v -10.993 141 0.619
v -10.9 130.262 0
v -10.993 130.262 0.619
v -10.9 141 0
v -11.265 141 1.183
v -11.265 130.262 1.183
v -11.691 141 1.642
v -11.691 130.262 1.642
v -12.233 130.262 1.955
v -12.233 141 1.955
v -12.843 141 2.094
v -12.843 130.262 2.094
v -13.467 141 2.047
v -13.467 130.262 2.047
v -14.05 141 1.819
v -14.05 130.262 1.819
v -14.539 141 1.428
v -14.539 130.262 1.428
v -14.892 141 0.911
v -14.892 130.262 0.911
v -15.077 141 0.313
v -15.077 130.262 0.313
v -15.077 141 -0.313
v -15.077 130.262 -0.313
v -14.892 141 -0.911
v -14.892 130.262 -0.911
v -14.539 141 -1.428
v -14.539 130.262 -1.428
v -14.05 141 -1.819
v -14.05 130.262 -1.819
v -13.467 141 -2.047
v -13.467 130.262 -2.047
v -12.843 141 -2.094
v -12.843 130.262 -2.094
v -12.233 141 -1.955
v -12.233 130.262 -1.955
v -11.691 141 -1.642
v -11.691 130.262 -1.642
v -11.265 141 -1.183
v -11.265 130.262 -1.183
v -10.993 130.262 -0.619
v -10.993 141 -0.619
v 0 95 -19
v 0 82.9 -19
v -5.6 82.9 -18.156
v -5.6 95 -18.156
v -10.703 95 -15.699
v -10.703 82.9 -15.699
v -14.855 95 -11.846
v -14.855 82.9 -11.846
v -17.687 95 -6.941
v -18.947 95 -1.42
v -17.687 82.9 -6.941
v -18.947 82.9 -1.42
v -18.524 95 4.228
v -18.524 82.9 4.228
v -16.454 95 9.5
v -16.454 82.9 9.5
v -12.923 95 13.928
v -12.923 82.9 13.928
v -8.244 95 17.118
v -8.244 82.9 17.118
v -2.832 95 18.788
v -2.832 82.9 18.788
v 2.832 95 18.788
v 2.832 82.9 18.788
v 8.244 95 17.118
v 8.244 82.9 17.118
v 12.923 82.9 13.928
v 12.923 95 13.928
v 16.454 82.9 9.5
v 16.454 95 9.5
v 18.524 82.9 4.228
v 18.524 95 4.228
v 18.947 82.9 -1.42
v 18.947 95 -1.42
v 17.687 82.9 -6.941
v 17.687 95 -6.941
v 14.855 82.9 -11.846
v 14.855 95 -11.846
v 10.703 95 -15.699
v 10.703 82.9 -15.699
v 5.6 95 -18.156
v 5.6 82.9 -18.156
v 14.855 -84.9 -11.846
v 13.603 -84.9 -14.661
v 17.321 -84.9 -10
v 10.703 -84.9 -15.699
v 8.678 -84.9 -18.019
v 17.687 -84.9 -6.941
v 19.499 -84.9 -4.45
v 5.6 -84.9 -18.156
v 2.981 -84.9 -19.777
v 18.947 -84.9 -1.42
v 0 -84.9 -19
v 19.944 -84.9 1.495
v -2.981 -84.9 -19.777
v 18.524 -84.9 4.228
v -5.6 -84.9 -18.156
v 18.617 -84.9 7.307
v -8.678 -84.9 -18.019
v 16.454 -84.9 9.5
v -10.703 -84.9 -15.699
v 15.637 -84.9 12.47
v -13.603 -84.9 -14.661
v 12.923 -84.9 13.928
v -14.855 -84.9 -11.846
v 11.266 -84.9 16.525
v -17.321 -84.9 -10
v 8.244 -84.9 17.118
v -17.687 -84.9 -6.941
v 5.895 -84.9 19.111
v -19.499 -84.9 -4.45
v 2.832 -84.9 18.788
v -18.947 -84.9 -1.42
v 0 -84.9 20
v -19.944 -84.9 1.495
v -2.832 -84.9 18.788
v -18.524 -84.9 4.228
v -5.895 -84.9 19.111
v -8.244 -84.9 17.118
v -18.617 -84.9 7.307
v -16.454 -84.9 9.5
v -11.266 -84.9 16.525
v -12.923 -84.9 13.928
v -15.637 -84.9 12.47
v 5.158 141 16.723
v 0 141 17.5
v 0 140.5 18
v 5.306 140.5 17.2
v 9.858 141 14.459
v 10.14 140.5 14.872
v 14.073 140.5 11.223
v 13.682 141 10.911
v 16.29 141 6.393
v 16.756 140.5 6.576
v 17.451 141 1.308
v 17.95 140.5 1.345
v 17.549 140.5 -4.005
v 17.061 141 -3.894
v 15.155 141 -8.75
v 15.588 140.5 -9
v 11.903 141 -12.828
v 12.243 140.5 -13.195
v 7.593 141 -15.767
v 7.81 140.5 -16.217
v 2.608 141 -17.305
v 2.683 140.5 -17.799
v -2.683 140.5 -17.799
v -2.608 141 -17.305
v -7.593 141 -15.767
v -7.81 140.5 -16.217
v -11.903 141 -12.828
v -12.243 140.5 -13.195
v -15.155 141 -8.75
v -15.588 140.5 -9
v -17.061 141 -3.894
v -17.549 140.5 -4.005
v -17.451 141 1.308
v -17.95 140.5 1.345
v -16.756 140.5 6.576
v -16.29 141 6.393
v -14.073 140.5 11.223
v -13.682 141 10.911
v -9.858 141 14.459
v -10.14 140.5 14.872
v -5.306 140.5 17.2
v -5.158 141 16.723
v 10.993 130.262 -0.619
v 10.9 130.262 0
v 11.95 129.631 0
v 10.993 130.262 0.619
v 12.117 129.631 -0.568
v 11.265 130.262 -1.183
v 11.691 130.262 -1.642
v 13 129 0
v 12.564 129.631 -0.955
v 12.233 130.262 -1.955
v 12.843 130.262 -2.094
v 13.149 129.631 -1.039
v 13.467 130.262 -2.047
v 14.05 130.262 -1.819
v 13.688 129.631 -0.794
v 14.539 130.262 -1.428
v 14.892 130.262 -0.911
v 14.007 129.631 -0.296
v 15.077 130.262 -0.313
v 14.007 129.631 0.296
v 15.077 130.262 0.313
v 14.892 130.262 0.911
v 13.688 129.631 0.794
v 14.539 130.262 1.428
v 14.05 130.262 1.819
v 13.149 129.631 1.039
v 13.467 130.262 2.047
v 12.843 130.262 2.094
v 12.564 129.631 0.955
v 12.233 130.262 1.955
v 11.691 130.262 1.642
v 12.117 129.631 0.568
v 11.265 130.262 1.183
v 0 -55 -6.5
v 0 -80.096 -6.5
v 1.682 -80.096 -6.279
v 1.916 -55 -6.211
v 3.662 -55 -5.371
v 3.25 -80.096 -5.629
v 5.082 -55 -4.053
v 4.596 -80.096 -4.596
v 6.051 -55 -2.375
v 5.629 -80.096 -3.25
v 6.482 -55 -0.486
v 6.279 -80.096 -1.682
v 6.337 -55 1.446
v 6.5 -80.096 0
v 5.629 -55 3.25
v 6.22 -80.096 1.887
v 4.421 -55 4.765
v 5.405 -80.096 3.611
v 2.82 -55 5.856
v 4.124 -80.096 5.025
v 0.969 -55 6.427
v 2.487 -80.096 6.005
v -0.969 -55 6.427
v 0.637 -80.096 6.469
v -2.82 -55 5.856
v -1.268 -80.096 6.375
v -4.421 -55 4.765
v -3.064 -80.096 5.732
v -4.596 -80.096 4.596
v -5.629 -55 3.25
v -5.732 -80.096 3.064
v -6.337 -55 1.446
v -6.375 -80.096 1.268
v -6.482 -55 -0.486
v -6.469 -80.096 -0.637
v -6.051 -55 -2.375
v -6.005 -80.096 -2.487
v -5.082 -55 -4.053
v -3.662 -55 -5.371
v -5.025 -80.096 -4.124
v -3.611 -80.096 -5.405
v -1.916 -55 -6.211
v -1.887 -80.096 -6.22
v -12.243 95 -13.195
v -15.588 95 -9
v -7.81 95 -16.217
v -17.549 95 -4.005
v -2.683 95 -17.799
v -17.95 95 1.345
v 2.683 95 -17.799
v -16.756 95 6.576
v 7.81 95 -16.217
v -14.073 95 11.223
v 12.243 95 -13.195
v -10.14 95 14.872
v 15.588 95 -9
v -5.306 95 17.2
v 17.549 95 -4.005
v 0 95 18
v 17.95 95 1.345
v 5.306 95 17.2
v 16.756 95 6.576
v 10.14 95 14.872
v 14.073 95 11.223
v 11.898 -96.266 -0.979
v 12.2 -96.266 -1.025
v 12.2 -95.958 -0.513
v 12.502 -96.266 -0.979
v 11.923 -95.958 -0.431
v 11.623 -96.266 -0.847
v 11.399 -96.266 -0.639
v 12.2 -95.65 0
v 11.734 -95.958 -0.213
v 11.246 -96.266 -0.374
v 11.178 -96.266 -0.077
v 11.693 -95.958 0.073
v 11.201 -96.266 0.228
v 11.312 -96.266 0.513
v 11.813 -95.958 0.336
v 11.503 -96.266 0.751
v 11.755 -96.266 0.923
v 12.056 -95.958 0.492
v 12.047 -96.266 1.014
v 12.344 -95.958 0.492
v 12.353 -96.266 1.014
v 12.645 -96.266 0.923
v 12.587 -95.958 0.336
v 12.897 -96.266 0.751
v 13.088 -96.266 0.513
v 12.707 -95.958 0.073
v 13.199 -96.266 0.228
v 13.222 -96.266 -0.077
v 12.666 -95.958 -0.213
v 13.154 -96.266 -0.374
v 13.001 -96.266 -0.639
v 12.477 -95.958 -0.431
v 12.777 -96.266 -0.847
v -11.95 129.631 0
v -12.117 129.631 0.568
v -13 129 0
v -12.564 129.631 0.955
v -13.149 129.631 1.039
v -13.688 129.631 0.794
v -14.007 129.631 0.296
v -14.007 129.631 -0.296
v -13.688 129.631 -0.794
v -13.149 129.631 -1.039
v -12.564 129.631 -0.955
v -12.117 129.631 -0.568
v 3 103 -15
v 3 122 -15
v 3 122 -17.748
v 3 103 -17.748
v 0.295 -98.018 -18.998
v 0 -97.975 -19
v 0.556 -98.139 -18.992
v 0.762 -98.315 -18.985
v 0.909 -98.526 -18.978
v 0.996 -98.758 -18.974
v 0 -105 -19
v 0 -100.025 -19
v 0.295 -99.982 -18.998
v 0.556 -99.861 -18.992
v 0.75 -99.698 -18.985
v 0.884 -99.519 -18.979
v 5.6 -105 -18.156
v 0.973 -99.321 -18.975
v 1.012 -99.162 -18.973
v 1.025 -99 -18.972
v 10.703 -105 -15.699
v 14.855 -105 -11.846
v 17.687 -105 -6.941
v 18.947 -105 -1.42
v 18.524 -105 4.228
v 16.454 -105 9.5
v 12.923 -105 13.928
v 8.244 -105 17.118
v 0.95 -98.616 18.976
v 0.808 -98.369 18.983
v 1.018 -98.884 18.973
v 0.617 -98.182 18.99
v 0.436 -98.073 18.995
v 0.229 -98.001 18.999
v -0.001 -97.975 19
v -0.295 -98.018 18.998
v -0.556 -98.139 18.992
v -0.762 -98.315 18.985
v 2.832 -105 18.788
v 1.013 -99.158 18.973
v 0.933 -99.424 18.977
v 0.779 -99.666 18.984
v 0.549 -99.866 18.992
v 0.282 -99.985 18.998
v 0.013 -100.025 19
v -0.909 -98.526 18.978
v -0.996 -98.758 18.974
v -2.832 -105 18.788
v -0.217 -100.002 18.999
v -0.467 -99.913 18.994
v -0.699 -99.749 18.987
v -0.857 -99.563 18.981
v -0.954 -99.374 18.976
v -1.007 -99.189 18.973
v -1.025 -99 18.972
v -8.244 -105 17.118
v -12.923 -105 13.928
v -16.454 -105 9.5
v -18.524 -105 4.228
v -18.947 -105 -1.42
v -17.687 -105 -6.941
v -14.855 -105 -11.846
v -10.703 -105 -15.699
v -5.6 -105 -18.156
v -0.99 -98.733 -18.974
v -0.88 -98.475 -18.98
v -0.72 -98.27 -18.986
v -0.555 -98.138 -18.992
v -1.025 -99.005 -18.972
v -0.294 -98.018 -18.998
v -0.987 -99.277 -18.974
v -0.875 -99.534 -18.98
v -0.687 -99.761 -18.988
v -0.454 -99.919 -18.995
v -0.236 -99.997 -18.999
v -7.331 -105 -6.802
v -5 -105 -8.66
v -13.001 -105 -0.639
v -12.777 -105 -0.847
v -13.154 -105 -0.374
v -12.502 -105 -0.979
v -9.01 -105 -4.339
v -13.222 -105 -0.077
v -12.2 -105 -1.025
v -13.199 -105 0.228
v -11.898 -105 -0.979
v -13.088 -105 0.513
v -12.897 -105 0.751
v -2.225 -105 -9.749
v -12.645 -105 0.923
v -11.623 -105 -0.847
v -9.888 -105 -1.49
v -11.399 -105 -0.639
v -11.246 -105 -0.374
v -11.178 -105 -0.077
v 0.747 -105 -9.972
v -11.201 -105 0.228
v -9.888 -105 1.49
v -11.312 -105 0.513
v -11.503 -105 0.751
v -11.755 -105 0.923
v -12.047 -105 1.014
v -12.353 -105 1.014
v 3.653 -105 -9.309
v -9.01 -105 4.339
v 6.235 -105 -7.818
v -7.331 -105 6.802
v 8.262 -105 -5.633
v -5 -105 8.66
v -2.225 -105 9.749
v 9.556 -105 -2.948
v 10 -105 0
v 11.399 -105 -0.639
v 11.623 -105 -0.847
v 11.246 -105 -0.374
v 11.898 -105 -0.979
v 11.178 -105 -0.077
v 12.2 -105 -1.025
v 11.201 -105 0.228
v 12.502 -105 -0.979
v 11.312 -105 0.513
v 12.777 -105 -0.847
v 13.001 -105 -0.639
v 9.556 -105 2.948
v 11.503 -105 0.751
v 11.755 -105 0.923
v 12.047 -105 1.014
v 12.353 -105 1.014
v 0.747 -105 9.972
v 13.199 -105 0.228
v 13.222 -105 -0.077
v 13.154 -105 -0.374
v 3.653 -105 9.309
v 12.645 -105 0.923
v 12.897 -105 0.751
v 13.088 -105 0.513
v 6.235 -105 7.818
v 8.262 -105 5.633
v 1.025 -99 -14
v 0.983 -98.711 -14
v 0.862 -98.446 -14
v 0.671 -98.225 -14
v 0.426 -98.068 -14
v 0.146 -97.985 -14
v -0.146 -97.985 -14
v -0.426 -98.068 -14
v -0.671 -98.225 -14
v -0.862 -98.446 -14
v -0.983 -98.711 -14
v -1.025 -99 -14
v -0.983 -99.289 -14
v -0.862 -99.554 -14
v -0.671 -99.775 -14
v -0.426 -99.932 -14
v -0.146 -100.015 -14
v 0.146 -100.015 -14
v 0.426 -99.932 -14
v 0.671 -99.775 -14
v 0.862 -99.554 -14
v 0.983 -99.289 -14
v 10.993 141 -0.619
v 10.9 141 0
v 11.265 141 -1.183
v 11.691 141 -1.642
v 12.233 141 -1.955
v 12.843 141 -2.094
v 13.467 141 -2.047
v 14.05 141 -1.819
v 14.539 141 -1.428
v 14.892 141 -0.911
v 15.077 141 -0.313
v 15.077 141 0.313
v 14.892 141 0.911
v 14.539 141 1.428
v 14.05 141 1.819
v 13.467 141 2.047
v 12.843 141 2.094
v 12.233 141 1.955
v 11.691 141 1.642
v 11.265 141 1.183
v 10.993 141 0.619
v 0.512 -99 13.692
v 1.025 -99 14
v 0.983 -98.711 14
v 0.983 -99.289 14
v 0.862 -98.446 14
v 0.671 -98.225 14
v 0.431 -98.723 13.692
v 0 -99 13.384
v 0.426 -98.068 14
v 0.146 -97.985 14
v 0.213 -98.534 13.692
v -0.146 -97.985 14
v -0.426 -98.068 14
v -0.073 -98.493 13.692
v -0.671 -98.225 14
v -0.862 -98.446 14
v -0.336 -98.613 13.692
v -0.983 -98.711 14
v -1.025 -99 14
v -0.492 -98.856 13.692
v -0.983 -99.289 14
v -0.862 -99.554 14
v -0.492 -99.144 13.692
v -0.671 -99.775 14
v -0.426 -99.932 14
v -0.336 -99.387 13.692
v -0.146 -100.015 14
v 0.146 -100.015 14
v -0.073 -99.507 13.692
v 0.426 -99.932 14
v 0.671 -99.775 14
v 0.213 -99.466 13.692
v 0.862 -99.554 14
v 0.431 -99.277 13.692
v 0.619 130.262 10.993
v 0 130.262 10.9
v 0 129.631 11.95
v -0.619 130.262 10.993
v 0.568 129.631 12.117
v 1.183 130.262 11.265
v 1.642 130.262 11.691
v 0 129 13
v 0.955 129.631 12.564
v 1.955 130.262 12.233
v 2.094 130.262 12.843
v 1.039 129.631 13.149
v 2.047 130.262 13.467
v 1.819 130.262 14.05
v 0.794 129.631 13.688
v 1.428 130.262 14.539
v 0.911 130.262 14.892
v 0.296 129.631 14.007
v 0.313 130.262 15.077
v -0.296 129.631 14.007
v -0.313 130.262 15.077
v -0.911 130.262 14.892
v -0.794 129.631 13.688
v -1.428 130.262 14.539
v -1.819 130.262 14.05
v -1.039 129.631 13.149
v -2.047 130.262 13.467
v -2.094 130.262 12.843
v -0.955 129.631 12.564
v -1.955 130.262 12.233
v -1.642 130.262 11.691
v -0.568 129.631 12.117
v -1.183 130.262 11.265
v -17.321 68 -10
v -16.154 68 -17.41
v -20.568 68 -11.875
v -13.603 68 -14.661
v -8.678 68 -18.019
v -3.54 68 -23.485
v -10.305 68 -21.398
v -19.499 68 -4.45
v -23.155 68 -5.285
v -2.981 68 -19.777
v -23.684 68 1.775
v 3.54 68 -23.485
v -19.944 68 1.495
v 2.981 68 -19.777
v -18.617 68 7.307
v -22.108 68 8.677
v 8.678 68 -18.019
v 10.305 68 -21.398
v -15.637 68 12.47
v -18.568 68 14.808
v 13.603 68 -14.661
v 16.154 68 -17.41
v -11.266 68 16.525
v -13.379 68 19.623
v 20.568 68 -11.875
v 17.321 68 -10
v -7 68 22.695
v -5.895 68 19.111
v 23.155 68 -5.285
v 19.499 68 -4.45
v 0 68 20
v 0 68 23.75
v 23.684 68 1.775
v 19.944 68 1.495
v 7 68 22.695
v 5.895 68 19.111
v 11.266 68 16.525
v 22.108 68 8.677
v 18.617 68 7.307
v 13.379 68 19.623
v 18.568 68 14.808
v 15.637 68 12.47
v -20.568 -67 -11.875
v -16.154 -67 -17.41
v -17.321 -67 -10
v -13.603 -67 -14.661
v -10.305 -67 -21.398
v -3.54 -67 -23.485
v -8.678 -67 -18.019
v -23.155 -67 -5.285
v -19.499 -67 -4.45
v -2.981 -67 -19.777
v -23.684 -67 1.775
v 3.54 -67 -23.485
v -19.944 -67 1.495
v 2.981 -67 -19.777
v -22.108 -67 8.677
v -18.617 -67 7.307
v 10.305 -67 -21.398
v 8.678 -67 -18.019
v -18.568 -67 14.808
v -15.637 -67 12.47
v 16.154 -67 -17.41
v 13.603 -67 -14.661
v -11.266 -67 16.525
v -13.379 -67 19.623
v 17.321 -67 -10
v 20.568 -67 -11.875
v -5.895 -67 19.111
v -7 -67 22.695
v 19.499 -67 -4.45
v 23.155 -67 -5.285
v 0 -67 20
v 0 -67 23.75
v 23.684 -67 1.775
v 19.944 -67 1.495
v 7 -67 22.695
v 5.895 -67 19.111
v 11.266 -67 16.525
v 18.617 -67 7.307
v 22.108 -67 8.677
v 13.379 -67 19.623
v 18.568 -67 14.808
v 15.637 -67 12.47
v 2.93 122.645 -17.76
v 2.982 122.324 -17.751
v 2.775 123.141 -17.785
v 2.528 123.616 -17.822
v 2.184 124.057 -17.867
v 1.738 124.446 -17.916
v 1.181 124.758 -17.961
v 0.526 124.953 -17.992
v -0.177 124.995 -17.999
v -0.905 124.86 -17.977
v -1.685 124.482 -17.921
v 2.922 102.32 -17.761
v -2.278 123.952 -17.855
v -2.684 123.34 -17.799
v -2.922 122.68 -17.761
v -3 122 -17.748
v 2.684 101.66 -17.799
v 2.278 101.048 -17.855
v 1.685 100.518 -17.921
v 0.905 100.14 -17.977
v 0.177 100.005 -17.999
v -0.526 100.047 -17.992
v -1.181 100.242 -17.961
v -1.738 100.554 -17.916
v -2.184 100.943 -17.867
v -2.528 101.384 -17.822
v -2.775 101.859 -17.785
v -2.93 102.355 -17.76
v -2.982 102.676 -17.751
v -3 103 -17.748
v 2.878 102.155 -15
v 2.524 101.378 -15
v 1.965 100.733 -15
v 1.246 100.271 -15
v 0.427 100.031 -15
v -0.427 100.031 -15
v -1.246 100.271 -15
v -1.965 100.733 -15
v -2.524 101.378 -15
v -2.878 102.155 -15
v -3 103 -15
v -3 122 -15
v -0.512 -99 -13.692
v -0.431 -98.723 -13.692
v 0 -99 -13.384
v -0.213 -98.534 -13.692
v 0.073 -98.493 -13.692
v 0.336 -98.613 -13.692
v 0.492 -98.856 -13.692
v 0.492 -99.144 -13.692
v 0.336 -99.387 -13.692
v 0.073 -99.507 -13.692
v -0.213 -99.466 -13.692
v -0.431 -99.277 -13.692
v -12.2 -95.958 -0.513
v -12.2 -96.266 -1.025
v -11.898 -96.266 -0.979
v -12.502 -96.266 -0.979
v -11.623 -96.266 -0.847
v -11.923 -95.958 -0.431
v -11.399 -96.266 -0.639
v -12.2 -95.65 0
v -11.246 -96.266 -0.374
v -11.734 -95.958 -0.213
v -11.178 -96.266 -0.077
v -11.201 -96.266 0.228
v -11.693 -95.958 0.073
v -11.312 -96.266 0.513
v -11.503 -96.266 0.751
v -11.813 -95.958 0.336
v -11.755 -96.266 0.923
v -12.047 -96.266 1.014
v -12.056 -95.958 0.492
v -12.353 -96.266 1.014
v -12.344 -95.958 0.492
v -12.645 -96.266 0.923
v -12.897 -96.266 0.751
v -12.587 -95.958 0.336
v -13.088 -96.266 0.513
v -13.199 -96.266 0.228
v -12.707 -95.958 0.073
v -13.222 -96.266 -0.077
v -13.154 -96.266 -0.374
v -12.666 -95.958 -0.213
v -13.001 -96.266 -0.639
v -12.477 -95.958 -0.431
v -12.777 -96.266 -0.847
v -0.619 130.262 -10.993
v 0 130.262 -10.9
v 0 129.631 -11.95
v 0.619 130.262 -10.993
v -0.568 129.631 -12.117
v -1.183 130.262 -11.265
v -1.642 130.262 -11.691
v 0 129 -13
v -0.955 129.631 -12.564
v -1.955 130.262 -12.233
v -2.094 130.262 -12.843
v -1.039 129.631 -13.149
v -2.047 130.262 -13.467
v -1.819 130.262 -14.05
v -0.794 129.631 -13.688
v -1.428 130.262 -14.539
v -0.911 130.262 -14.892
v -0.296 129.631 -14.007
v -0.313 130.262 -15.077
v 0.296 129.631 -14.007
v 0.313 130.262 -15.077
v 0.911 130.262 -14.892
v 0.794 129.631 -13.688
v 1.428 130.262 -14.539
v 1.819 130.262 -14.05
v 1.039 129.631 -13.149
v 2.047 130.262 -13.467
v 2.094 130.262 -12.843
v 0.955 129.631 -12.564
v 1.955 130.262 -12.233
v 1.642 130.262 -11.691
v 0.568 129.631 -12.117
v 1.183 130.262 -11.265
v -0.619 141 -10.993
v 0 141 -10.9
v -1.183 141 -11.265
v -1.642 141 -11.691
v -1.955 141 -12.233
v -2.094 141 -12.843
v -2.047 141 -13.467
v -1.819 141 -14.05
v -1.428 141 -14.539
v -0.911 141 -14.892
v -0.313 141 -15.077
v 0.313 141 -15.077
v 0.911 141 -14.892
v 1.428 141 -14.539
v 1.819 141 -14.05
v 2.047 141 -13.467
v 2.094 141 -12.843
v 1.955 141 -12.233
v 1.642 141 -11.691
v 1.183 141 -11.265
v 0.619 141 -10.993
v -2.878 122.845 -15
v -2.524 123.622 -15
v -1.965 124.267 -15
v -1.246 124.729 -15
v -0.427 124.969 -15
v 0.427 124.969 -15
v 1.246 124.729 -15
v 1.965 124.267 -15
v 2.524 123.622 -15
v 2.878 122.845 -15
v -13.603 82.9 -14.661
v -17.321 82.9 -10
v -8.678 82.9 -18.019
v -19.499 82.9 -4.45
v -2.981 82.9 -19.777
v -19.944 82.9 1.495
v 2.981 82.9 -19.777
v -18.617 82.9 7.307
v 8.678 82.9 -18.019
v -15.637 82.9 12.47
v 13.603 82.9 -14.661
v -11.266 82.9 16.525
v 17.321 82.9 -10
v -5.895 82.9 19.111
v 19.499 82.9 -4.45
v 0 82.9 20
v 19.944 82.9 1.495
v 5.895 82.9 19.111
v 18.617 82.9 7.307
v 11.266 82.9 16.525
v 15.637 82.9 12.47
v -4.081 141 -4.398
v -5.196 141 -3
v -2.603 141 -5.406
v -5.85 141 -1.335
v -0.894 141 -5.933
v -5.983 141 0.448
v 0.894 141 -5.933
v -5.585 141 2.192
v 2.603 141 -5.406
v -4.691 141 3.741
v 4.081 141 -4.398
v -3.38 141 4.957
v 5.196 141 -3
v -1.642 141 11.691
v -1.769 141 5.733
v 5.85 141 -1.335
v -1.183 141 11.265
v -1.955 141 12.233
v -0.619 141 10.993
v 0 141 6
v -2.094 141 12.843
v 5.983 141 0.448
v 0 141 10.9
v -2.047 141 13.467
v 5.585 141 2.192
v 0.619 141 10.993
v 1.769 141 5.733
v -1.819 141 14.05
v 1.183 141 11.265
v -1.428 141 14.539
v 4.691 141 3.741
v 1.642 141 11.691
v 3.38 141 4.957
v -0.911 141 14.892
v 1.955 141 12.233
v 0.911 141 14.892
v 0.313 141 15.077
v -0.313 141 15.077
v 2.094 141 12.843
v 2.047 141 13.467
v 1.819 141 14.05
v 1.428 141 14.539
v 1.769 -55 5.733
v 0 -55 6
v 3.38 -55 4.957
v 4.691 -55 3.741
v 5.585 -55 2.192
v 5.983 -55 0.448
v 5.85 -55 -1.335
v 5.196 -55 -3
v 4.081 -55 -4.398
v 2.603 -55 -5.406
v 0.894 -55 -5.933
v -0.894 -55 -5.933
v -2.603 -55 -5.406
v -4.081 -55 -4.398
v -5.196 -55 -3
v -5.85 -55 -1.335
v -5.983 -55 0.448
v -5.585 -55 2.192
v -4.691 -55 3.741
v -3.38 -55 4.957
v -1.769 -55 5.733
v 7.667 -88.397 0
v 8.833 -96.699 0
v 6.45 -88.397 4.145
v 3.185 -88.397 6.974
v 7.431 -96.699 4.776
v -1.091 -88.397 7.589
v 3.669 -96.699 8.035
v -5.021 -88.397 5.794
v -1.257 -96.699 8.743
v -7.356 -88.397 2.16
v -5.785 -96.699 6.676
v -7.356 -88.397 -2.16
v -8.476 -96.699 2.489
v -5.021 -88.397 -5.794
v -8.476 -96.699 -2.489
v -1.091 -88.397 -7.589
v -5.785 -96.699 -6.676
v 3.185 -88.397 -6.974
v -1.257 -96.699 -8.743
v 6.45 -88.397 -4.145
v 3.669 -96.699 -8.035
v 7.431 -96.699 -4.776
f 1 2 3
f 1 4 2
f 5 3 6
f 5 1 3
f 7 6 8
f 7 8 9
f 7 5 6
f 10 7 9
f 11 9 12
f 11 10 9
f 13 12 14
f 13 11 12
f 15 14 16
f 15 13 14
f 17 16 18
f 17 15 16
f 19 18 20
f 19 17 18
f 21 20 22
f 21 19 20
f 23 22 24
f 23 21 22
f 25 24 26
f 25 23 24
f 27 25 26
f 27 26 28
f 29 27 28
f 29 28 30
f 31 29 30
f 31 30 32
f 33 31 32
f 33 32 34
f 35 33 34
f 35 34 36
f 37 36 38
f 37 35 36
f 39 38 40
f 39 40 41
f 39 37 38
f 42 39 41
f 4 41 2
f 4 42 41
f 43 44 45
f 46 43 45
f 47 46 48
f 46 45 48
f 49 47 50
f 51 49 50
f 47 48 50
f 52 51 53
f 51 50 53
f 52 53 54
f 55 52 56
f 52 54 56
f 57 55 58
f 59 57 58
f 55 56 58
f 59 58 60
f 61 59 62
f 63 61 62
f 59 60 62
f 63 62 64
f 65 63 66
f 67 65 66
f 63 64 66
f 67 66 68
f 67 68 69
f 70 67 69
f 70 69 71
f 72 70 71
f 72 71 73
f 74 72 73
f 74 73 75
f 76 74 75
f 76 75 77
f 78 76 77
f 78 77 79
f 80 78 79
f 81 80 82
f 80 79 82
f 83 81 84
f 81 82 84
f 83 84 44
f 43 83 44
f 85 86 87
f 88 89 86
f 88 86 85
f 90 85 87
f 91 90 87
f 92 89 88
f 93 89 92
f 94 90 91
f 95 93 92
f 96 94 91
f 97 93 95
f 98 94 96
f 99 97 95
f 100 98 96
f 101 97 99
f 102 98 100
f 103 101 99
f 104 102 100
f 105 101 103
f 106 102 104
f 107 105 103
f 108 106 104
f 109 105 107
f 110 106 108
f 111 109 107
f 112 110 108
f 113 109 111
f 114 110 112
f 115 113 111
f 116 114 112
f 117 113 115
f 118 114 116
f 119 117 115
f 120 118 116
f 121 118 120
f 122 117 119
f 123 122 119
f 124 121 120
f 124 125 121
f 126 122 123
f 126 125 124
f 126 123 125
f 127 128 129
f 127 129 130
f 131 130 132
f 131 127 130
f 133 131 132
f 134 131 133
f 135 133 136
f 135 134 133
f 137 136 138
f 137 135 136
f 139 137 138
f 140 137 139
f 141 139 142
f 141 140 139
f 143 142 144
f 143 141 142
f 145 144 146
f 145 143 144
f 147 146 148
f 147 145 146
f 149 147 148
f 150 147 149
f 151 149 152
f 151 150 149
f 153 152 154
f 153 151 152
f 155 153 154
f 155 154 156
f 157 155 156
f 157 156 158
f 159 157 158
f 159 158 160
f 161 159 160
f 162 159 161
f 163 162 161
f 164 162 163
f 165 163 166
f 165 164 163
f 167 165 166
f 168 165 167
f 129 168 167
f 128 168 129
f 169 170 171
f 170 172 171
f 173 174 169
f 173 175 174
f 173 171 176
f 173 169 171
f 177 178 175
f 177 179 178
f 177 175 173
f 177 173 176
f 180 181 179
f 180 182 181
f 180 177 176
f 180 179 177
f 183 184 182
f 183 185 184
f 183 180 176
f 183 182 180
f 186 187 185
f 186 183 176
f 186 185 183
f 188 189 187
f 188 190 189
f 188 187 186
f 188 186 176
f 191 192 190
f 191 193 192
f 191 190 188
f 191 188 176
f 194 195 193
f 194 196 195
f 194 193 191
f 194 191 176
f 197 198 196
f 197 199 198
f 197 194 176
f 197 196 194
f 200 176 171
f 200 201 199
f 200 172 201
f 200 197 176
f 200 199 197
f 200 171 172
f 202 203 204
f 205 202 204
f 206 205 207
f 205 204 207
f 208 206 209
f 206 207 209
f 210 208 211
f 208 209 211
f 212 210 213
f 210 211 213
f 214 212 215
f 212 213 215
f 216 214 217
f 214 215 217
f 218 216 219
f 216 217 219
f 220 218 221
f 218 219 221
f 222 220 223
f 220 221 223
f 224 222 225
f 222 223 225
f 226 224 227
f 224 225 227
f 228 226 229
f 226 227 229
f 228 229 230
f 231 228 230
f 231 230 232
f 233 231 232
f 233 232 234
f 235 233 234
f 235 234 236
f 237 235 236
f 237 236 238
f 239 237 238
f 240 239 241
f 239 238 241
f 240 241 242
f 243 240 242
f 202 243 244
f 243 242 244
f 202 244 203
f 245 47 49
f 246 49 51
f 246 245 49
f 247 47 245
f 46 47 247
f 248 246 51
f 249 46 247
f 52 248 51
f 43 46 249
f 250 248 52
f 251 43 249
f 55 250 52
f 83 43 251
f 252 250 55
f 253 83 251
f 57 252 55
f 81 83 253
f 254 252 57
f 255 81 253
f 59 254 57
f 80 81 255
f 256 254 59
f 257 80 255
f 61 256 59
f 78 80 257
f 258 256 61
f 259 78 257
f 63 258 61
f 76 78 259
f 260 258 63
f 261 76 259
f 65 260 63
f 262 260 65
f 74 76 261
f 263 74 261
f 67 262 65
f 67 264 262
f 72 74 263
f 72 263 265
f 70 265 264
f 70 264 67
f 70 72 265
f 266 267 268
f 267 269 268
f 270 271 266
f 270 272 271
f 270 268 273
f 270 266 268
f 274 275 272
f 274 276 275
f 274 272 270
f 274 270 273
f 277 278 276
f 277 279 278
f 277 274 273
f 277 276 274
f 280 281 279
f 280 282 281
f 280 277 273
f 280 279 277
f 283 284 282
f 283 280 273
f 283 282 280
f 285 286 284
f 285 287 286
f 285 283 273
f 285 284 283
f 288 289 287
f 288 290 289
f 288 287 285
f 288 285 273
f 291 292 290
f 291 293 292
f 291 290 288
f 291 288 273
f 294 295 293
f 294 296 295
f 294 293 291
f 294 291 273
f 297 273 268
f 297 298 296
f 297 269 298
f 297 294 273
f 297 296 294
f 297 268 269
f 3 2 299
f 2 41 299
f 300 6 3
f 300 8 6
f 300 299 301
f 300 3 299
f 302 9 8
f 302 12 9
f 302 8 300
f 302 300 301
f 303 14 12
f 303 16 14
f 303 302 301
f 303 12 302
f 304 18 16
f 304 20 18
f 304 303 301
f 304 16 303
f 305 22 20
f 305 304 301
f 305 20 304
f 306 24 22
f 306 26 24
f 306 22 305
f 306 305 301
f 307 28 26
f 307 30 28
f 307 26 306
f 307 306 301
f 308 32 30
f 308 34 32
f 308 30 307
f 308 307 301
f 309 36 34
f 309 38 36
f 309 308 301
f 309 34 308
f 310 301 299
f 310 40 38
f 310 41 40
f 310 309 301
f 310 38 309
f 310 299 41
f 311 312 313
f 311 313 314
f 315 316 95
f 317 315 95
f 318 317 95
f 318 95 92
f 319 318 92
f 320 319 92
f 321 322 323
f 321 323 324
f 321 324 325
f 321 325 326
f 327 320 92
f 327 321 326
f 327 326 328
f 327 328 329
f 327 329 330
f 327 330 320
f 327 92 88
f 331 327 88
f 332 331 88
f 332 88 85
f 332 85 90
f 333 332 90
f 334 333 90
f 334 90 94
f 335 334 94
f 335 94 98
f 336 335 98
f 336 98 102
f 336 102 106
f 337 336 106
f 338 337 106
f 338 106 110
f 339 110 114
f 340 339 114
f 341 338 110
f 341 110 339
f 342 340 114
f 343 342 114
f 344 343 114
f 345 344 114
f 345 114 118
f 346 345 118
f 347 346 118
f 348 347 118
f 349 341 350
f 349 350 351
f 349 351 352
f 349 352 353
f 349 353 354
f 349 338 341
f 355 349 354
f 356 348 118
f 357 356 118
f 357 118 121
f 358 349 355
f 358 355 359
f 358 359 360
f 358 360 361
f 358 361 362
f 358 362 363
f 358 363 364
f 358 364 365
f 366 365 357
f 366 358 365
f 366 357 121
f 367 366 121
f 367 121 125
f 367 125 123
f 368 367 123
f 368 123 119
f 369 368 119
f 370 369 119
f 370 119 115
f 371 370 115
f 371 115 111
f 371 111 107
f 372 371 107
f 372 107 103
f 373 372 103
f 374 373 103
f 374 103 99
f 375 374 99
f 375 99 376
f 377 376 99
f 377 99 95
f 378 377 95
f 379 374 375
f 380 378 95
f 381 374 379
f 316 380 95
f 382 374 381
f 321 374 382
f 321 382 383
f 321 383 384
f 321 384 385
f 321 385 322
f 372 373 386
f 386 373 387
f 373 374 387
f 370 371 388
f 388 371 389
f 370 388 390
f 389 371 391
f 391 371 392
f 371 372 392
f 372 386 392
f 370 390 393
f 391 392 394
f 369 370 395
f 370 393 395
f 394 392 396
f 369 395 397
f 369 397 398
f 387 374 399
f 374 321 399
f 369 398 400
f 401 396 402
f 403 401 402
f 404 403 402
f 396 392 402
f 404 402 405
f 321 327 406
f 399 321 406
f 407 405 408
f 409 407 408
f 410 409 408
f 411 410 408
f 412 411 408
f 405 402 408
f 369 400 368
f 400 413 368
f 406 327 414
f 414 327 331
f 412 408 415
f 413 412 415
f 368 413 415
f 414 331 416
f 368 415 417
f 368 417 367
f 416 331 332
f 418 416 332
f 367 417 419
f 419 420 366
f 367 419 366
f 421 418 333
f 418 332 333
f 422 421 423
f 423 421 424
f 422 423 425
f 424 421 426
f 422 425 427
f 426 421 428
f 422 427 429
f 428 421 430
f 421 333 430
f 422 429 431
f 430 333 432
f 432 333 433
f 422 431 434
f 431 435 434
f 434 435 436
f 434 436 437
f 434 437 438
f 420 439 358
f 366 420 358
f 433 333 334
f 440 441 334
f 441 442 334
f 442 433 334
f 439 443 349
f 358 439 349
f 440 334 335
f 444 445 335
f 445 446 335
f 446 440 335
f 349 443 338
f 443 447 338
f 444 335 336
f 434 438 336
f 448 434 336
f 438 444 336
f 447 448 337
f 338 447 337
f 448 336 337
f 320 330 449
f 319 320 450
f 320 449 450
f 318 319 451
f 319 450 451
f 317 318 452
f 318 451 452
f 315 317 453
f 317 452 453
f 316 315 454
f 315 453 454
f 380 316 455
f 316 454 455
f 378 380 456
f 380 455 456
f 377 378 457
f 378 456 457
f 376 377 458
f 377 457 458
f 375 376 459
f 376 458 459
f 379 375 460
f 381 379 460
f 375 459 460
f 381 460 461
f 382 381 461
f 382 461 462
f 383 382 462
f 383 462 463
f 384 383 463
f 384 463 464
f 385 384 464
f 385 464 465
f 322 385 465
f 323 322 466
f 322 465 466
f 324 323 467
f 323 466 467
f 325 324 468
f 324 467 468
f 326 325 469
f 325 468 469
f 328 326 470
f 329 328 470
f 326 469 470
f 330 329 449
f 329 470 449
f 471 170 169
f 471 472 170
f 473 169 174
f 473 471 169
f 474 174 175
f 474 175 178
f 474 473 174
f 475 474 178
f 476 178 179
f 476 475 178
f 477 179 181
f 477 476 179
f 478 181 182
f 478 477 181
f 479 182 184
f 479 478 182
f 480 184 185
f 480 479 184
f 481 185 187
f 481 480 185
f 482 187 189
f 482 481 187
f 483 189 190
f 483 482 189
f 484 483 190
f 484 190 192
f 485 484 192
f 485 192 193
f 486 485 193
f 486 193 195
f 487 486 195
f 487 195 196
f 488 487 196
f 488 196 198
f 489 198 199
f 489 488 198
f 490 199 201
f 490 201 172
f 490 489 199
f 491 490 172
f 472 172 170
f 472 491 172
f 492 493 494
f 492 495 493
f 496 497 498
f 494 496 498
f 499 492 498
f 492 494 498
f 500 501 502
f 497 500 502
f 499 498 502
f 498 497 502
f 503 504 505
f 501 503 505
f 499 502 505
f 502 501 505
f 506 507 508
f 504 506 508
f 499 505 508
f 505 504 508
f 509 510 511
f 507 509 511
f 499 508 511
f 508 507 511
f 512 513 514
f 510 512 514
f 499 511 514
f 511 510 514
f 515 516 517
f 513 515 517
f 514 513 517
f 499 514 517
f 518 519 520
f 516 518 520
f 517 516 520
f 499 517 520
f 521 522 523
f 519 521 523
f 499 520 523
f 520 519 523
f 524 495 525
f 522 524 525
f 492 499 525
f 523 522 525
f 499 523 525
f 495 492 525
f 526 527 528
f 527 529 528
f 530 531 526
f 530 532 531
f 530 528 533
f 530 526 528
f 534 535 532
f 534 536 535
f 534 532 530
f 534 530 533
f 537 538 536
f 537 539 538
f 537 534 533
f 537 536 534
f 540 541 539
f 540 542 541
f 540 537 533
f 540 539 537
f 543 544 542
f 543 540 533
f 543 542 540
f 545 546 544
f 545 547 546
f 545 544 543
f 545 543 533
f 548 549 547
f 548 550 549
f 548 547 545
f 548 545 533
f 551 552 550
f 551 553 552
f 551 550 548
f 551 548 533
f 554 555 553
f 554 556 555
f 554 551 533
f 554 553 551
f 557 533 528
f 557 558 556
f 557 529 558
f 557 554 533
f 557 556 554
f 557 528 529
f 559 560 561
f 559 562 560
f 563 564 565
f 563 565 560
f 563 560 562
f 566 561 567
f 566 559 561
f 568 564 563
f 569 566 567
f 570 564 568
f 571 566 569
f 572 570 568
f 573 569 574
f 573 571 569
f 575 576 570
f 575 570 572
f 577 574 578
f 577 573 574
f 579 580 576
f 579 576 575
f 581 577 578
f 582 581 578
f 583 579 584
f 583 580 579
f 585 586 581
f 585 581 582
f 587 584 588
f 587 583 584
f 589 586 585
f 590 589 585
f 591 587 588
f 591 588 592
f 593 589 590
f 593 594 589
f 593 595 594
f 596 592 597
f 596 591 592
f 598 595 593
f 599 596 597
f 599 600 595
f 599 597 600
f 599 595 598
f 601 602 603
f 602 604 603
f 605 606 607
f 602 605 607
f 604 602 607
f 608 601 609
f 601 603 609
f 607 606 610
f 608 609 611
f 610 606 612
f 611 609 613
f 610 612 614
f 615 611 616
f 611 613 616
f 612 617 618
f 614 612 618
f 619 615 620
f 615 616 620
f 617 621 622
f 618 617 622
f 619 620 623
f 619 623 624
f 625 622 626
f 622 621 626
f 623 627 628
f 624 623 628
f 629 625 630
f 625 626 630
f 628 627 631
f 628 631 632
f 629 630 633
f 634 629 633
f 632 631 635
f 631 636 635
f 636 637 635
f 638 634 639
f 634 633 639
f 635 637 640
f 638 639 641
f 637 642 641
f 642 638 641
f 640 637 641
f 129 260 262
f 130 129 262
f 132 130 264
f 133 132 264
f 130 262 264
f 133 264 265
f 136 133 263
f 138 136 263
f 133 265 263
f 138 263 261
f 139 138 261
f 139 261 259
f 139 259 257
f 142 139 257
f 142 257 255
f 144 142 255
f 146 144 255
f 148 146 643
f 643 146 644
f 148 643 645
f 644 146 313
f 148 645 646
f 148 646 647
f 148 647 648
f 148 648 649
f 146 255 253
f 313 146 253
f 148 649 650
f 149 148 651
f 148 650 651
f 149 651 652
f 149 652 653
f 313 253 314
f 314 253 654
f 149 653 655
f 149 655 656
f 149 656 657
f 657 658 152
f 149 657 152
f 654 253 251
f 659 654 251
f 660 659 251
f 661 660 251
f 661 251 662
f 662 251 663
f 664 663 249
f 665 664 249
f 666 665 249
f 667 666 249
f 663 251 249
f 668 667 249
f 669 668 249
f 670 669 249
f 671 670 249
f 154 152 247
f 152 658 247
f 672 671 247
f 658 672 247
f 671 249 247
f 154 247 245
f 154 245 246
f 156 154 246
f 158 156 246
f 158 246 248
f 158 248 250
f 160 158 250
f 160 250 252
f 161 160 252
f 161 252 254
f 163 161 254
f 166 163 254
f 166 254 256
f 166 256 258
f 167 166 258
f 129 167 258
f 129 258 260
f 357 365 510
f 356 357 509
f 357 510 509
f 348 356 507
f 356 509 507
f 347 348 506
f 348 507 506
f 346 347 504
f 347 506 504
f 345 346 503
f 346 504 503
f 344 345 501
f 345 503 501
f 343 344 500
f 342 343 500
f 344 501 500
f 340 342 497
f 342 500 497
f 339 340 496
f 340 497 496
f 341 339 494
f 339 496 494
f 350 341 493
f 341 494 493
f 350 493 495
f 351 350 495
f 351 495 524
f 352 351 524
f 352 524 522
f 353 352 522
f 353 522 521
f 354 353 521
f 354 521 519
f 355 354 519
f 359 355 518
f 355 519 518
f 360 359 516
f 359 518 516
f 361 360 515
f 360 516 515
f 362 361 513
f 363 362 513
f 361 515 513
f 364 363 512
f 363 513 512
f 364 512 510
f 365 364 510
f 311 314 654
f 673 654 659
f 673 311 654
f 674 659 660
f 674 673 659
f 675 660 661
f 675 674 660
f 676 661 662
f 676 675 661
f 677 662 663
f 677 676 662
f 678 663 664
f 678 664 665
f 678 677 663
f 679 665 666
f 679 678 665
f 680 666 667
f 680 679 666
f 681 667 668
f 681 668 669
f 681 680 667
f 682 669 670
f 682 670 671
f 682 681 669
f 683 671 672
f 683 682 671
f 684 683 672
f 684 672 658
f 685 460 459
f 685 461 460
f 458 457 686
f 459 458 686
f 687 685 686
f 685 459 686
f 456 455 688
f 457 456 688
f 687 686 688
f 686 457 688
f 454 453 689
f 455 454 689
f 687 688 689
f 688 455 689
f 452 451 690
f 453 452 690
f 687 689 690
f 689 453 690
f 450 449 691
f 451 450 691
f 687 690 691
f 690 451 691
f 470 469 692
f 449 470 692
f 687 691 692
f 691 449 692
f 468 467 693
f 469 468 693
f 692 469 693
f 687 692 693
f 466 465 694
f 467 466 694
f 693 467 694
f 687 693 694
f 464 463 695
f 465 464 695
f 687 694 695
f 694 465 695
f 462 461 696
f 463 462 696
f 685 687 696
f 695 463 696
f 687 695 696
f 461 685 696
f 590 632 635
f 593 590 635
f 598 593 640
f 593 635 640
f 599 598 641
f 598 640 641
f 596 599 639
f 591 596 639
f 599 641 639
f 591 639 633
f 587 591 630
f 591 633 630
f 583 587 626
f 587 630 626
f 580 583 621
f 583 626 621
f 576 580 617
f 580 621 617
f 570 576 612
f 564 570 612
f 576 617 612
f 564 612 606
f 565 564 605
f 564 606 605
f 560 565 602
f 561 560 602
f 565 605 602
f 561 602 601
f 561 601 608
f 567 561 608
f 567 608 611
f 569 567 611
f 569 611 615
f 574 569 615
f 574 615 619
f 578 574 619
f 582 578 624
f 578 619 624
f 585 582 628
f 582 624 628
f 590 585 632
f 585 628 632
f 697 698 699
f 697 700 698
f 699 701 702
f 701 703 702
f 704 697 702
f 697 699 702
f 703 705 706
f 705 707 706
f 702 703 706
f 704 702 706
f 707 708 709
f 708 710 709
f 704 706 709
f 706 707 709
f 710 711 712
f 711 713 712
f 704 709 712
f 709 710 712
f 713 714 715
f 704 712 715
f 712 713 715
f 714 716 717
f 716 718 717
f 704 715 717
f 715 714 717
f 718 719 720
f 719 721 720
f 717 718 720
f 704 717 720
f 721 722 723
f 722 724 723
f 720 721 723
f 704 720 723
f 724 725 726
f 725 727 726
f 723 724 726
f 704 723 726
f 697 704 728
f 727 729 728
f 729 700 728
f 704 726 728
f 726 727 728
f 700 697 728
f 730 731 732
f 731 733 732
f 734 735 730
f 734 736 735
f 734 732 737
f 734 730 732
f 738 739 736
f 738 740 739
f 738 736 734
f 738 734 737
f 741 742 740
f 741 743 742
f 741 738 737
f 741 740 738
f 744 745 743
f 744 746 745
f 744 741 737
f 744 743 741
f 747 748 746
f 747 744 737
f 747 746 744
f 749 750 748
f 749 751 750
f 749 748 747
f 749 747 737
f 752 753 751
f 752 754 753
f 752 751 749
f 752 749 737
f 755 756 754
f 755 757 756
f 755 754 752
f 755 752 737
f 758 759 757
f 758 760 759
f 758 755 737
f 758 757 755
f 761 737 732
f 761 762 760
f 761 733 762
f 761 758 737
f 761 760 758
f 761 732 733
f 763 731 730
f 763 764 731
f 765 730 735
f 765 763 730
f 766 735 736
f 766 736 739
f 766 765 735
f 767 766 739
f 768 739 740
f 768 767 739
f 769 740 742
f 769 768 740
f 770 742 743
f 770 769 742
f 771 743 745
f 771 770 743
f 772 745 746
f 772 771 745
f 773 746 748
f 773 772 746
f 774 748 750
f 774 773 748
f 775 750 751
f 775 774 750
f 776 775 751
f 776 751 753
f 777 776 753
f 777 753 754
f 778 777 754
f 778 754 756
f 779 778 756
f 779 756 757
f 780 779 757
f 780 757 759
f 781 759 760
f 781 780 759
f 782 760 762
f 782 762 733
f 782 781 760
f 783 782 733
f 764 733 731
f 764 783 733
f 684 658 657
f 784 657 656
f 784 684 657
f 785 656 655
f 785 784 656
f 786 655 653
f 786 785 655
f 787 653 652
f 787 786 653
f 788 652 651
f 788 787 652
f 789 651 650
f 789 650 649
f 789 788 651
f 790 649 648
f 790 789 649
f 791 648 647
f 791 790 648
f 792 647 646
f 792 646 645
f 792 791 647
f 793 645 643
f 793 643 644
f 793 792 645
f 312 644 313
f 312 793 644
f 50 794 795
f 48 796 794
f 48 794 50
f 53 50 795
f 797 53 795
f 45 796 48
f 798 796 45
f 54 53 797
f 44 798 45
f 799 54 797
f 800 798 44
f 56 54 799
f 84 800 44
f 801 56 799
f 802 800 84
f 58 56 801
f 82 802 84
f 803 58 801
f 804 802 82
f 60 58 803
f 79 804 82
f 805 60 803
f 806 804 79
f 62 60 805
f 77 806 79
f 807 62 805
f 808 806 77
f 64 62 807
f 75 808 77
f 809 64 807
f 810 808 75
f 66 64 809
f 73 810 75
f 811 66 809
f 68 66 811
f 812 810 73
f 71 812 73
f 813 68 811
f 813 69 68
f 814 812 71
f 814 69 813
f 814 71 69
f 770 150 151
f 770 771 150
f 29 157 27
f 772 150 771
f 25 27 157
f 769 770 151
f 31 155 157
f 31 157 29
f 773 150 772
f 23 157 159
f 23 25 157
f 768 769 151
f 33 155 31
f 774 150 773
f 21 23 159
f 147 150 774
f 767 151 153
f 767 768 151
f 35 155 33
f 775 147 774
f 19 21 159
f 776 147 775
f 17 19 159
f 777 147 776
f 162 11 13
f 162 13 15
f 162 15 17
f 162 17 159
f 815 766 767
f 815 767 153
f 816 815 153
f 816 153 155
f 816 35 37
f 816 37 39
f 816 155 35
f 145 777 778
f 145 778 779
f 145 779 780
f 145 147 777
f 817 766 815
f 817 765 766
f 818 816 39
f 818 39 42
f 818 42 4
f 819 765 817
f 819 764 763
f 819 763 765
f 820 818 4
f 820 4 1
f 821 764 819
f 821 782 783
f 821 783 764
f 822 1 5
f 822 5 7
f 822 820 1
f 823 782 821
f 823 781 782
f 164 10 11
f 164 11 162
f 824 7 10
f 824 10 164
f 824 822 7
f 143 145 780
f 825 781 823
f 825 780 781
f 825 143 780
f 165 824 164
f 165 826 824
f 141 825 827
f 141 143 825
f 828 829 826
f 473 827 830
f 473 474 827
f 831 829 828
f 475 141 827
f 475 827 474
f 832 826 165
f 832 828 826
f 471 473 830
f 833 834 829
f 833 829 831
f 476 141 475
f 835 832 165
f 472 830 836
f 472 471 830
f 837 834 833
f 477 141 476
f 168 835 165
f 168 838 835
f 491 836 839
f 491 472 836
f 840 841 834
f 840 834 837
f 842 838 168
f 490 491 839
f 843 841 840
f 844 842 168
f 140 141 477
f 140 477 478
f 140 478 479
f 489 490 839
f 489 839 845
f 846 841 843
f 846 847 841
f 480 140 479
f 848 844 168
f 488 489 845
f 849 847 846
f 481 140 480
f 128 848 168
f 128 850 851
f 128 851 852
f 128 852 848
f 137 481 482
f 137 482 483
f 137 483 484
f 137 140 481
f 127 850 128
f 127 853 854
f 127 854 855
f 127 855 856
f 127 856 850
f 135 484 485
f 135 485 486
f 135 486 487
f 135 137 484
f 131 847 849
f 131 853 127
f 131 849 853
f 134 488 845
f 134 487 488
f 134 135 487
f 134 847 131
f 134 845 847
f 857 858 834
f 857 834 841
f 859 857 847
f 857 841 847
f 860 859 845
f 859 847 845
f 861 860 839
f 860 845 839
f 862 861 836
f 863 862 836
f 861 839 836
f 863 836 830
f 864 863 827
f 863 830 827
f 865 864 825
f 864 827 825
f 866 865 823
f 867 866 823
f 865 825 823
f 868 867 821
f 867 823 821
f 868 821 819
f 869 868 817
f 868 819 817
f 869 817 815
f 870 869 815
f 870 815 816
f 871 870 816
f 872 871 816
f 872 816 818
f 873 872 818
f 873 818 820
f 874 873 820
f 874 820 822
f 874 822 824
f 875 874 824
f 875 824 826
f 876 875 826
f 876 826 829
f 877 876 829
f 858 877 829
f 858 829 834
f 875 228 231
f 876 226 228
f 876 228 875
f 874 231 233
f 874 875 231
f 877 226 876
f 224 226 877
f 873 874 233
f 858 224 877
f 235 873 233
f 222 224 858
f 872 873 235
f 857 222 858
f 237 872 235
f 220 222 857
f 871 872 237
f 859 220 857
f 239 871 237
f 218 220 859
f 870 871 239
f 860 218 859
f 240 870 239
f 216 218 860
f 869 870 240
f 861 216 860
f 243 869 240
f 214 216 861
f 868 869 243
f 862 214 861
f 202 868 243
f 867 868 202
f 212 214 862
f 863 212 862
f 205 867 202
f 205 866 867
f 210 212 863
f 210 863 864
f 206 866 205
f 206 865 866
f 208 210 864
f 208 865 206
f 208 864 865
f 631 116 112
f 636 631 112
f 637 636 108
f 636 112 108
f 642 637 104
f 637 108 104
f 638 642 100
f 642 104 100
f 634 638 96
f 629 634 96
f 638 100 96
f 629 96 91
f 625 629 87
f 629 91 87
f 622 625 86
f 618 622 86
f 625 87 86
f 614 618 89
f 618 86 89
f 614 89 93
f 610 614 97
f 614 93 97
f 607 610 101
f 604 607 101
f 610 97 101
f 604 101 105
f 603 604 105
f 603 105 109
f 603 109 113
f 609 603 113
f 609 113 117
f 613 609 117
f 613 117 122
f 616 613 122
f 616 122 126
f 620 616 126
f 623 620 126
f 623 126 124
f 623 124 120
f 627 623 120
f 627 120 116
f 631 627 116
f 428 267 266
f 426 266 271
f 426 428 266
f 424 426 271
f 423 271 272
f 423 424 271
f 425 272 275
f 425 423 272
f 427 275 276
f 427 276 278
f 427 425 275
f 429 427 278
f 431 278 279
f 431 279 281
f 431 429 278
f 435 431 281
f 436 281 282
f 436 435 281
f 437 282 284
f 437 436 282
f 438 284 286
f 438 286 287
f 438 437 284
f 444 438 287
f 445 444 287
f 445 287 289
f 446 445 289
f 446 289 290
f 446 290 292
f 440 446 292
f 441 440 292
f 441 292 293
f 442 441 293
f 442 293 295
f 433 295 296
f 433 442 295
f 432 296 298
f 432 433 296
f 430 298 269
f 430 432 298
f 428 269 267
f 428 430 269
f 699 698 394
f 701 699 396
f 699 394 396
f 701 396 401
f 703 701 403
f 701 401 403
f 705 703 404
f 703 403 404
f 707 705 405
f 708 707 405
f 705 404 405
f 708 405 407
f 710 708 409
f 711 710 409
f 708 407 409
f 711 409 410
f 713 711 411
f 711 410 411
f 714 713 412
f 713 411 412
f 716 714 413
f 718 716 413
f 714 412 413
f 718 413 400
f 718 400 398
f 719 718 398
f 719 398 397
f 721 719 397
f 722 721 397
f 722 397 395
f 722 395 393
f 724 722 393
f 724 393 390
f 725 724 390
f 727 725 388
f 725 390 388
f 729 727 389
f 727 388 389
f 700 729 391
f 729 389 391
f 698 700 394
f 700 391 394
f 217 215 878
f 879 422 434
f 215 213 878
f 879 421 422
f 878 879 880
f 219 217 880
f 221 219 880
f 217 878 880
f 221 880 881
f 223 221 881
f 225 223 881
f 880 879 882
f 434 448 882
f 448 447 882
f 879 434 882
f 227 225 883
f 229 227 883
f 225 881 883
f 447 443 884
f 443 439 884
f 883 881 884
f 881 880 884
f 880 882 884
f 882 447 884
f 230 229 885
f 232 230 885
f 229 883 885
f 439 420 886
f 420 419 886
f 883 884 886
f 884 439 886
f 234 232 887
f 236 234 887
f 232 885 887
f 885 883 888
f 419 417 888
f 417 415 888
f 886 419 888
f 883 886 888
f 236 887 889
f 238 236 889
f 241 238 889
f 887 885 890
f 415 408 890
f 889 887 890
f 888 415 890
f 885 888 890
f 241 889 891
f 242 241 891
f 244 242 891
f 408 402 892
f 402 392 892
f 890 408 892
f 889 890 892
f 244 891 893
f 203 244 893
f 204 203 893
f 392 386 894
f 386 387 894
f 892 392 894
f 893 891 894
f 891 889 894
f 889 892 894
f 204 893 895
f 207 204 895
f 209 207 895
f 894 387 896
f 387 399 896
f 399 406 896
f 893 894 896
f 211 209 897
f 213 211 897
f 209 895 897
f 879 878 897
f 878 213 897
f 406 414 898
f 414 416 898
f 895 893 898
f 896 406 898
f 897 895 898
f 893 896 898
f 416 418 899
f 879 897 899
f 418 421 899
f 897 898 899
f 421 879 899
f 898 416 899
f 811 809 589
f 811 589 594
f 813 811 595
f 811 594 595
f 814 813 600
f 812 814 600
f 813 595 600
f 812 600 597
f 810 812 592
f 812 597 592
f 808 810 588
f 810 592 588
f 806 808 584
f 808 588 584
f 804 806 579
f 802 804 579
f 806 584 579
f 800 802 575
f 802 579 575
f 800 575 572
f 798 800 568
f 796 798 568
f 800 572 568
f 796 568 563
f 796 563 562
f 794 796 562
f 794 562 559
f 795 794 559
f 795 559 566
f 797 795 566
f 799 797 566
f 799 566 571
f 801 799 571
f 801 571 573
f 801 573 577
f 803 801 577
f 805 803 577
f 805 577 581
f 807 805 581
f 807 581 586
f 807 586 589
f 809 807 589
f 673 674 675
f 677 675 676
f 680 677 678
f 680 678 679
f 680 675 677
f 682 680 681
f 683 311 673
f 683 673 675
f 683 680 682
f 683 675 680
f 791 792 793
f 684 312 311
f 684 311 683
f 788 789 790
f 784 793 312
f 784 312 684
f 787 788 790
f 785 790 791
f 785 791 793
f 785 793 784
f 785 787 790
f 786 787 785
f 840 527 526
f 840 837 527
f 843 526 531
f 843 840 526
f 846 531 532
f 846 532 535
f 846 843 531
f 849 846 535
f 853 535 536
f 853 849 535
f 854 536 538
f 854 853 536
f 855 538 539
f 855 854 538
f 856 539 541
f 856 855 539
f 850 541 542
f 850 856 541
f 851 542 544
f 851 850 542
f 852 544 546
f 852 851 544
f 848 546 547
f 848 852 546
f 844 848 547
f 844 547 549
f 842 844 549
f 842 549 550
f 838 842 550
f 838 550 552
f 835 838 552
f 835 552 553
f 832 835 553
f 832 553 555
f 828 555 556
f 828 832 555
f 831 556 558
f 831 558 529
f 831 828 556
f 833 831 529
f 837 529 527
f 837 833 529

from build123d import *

# Parameters (mm, degrees)
BOSS_EXTRUDE1_DEPTH                    = 95
BOSS_EXTRUDE1_DEPTH_BACK               = 105
SKETCH1_R                              = 25
SKETCH2_R                              = 18
BOSS_EXTRUDE2_DEPTH                    = 46
CUT_EXTRUDE1_DEPTH                     = 10
CHAMFER1_SIZE                          = 0.5
SKETCH9_R                              = 10
CUT_EXTRUDE2_DEPTH                     = 30
CUT_EXTRUDE2_DRAFT                     = -8
SKETCH10_R                             = 6.5
CUT_EXTRUDE3_DEPTH                     = 50
SKETCH11_R                             = 6
CUT_EXTRUDE4_DEPTH                     = 249.527664456
CIRPATTERN1_COUNT                      = 4
CUT_EXTRUDE6_START                     = 69
SKETCH21_R                             = 25
SKETCH21_R_2                           = 20
CUT_EXTRUDE6_DEPTH                     = 27
CUT_EXTRUDE7_START                     = -105
SKETCH21_2_R                           = 25
SKETCH21_2_R_2                         = 20
CUT_EXTRUDE7_DEPTH                     = 39
CUT_EXTRUDE8_START                     = -162
SKETCH23_R                             = 25
SKETCH23_R_2                           = 23.75
CUT_EXTRUDE8_DEPTH                     = 135
SKETCH24_R                             = 20
SKETCH24_R_2                           = 19
CUT_EXTRUDE9_DEPTH                     = 20.1
M2_5X0_45_TAPPED_HOLE2_D               = 2.05
M2_5X0_45_TAPPED_HOLE2_DEPTH           = 5
M2_5X0_45_TAPPED_HOLE2_TIP             = 0.615882135
M2_5X0_45_TAPPED_HOLE2_ON_FACE_2_D     = 2.05
M2_5X0_45_TAPPED_HOLE2_ON_FACE_2_DEPTH = 5
M2_5X0_45_TAPPED_HOLE2_ON_FACE_2_TIP   = 0.615882135
CUT_EXTRUDE10_START                    = -12.1
SKETCH25_R                             = 20
SKETCH25_R_2                           = 19
CUT_EXTRUDE10_DEPTH                    = 12.1


with BuildPart() as part:
    # Sketch1 → Boss-Extrude1 (new, two sides: drawn at the far end of the back side and taken through both)
    with BuildSketch(Plane(origin=(0, 0, 0), x_dir=(1, 0, 0), z_dir=(0, 1, 0)).offset(-BOSS_EXTRUDE1_DEPTH_BACK)):
        Circle(SKETCH1_R)
    extrude(amount=BOSS_EXTRUDE1_DEPTH + BOSS_EXTRUDE1_DEPTH_BACK)

    # Sketch2 → Boss-Extrude2 (add)
    with BuildSketch(Plane(origin=(0, 95, 0), x_dir=(1, 0, 0), z_dir=(0, 1, 0))):
        Circle(SKETCH2_R)
    extrude(amount=BOSS_EXTRUDE2_DEPTH)

    # Sketch8 → Cut-Extrude1 (cut)
    with BuildSketch(Plane.XY.offset(-15)):
        with BuildLine():
            Line((3, 122), (3, 103))
            ThreePointArc((3, 103), (0, 100), (-3, 103))
            Line((-3, 103), (-3, 122))
            ThreePointArc((-3, 122), (0, 125), (3, 122))
        make_face()
    extrude(amount=-CUT_EXTRUDE1_DEPTH, mode=Mode.SUBTRACT)

    # Chamfer1
    chamfer1_edges = [part.edges().sort_by_distance(p)[0] for p in [
        (-18, 141, 0),
    ]]
    chamfer(chamfer1_edges, length=CHAMFER1_SIZE)


with BuildPart() as cut_extrude2_tool:
    # Sketch9 → Cut-Extrude2 (with draft: the straight prism first)
    with BuildSketch(Plane.XZ.offset(105)):
        Circle(SKETCH9_R)
    extrude(amount=-CUT_EXTRUDE2_DEPTH)
    # Cut-Extrude2: the draft: its side faces are tilted about the plane it starts from
    cut_extrude2_sides = [cut_extrude2_tool.faces().sort_by_distance(p)[0] for p in [
        (-10, -90, 0),
    ]]
    draft(cut_extrude2_sides, Plane.XZ.offset(105), CUT_EXTRUDE2_DRAFT)


with BuildPart() as part_1:
    add(part.part)

    # Cut-Extrude2: cut by cut_extrude2_tool
    add(cut_extrude2_tool.part, mode=Mode.SUBTRACT)

    # Sketch10 → Cut-Extrude3 (cut)
    with BuildSketch(Plane.XZ.offset(105)):
        Circle(SKETCH10_R)
    extrude(amount=-CUT_EXTRUDE3_DEPTH, mode=Mode.SUBTRACT)

    # Sketch11 → Cut-Extrude4 (cut, through all)
    with BuildSketch(Plane(origin=(0, 141, 0), x_dir=(1, 0, 0), z_dir=(0, 1, 0))):
        Circle(SKETCH11_R)
    extrude(amount=-CUT_EXTRUDE4_DEPTH, mode=Mode.SUBTRACT)

    # Sketch15 → M5x0.8 Tapped Hole1 (revolve, cut)
    with BuildSketch(Plane(origin=(0, 141, -13), x_dir=(0, 0, 1), z_dir=(1, 0, 0))):
        Polygon((0, 0), (0, 12), (2.1, 10.7381927), (2.1, 0), align=None)
    m5x0_8_tapped_hole1 = revolve(axis=Axis((0, 147.35, -13), (0, -1, 0)), mode=Mode.SUBTRACT)

    # CirPattern1: M5x0.8 Tapped Hole1 ×4 about axis
    cirpattern1_axis = Axis((0, -105, 0), (0, 1, 0))
    for i in range(1, CIRPATTERN1_COUNT):
        add(m5x0_8_tapped_hole1.rotate(cirpattern1_axis, i * 360 / CIRPATTERN1_COUNT), mode=Mode.SUBTRACT)

    # Sketch20 → M2.5x0.45 Tapped Hole1 (revolve, cut)
    with BuildSketch(Plane(origin=(12.2, -105, 0), x_dir=(0, 0, -1), z_dir=(1, 0, 0))):
        Polygon((0, 0), (0, 9.35), (1.025, 8.734117865), (1.025, 0), align=None)
    m2_5x0_45_tapped_hole1 = revolve(axis=Axis((12.2, -111.35, 0), (0, 1, 0)), mode=Mode.SUBTRACT)

    # Mirror2: M2.5x0.45 Tapped Hole1 across plane
    add(m2_5x0_45_tapped_hole1.mirror(Plane(origin=(0, 0, 0), x_dir=(0, 0, 1), z_dir=(1, 0, 0))), mode=Mode.SUBTRACT)

    # Sketch21 → Cut-Extrude6 (cut)
    with BuildSketch(Plane(origin=(0, -1, 0), x_dir=(1, 0, 0), z_dir=(0, 1, 0)).offset(CUT_EXTRUDE6_START)):
        Circle(SKETCH21_R)
        Circle(SKETCH21_R_2, mode=Mode.SUBTRACT)
    extrude(amount=CUT_EXTRUDE6_DEPTH, mode=Mode.SUBTRACT)

    # Sketch21<2> → Cut-Extrude7 (cut)
    with BuildSketch(Plane(origin=(0, -1, 0), x_dir=(1, 0, 0), z_dir=(0, 1, 0)).offset(CUT_EXTRUDE7_START)):
        Circle(SKETCH21_2_R)
        Circle(SKETCH21_2_R_2, mode=Mode.SUBTRACT)
    extrude(amount=CUT_EXTRUDE7_DEPTH, mode=Mode.SUBTRACT)

    # Sketch23 → Cut-Extrude8 (cut)
    with BuildSketch(Plane(origin=(0, 95, 0), x_dir=(1, 0, 0), z_dir=(0, 1, 0)).offset(CUT_EXTRUDE8_START)):
        Circle(SKETCH23_R)
        Circle(SKETCH23_R_2, mode=Mode.SUBTRACT)
    extrude(amount=CUT_EXTRUDE8_DEPTH, mode=Mode.SUBTRACT)

    # Sketch24 → Cut-Extrude9 (cut)
    with BuildSketch(Plane.XZ.offset(105)):
        Circle(SKETCH24_R)
        Circle(SKETCH24_R_2, mode=Mode.SUBTRACT)
    extrude(amount=-CUT_EXTRUDE9_DEPTH, mode=Mode.SUBTRACT)

    # M2.5x0.45 Tapped Hole2
    with Locations(Plane(origin=(0, -99, -19), x_dir=(-1, 0, 0), z_dir=(0, 0, -1))):
        with Locations((0, 0)):
            Hole(M2_5X0_45_TAPPED_HOLE2_D / 2, depth=M2_5X0_45_TAPPED_HOLE2_DEPTH)
            with Locations((0, 0, -(M2_5X0_45_TAPPED_HOLE2_DEPTH + M2_5X0_45_TAPPED_HOLE2_TIP / 2))):  # 118° drill point
                Cone(0, M2_5X0_45_TAPPED_HOLE2_D / 2, M2_5X0_45_TAPPED_HOLE2_TIP, mode=Mode.SUBTRACT)

    # M2.5x0.45 Tapped Hole2 on face 2
    with Locations(Plane(origin=(0, -99, 19), x_dir=(1, 0, 0), z_dir=(0, 0, 1))):
        with Locations((0, 0)):
            Hole(M2_5X0_45_TAPPED_HOLE2_ON_FACE_2_D / 2, depth=M2_5X0_45_TAPPED_HOLE2_ON_FACE_2_DEPTH)
            with Locations((0, 0, -(M2_5X0_45_TAPPED_HOLE2_ON_FACE_2_DEPTH + M2_5X0_45_TAPPED_HOLE2_ON_FACE_2_TIP / 2))):  # 118° drill point
                Cone(0, M2_5X0_45_TAPPED_HOLE2_ON_FACE_2_D / 2, M2_5X0_45_TAPPED_HOLE2_ON_FACE_2_TIP, mode=Mode.SUBTRACT)

    # Sketch25 → Cut-Extrude10 (cut)
    with BuildSketch(Plane(origin=(0, 95, 0), x_dir=(1, 0, 0), z_dir=(0, 1, 0)).offset(CUT_EXTRUDE10_START)):
        Circle(SKETCH25_R)
        Circle(SKETCH25_R_2, mode=Mode.SUBTRACT)
    extrude(amount=CUT_EXTRUDE10_DEPTH, mode=Mode.SUBTRACT)


solid = part_1.part
